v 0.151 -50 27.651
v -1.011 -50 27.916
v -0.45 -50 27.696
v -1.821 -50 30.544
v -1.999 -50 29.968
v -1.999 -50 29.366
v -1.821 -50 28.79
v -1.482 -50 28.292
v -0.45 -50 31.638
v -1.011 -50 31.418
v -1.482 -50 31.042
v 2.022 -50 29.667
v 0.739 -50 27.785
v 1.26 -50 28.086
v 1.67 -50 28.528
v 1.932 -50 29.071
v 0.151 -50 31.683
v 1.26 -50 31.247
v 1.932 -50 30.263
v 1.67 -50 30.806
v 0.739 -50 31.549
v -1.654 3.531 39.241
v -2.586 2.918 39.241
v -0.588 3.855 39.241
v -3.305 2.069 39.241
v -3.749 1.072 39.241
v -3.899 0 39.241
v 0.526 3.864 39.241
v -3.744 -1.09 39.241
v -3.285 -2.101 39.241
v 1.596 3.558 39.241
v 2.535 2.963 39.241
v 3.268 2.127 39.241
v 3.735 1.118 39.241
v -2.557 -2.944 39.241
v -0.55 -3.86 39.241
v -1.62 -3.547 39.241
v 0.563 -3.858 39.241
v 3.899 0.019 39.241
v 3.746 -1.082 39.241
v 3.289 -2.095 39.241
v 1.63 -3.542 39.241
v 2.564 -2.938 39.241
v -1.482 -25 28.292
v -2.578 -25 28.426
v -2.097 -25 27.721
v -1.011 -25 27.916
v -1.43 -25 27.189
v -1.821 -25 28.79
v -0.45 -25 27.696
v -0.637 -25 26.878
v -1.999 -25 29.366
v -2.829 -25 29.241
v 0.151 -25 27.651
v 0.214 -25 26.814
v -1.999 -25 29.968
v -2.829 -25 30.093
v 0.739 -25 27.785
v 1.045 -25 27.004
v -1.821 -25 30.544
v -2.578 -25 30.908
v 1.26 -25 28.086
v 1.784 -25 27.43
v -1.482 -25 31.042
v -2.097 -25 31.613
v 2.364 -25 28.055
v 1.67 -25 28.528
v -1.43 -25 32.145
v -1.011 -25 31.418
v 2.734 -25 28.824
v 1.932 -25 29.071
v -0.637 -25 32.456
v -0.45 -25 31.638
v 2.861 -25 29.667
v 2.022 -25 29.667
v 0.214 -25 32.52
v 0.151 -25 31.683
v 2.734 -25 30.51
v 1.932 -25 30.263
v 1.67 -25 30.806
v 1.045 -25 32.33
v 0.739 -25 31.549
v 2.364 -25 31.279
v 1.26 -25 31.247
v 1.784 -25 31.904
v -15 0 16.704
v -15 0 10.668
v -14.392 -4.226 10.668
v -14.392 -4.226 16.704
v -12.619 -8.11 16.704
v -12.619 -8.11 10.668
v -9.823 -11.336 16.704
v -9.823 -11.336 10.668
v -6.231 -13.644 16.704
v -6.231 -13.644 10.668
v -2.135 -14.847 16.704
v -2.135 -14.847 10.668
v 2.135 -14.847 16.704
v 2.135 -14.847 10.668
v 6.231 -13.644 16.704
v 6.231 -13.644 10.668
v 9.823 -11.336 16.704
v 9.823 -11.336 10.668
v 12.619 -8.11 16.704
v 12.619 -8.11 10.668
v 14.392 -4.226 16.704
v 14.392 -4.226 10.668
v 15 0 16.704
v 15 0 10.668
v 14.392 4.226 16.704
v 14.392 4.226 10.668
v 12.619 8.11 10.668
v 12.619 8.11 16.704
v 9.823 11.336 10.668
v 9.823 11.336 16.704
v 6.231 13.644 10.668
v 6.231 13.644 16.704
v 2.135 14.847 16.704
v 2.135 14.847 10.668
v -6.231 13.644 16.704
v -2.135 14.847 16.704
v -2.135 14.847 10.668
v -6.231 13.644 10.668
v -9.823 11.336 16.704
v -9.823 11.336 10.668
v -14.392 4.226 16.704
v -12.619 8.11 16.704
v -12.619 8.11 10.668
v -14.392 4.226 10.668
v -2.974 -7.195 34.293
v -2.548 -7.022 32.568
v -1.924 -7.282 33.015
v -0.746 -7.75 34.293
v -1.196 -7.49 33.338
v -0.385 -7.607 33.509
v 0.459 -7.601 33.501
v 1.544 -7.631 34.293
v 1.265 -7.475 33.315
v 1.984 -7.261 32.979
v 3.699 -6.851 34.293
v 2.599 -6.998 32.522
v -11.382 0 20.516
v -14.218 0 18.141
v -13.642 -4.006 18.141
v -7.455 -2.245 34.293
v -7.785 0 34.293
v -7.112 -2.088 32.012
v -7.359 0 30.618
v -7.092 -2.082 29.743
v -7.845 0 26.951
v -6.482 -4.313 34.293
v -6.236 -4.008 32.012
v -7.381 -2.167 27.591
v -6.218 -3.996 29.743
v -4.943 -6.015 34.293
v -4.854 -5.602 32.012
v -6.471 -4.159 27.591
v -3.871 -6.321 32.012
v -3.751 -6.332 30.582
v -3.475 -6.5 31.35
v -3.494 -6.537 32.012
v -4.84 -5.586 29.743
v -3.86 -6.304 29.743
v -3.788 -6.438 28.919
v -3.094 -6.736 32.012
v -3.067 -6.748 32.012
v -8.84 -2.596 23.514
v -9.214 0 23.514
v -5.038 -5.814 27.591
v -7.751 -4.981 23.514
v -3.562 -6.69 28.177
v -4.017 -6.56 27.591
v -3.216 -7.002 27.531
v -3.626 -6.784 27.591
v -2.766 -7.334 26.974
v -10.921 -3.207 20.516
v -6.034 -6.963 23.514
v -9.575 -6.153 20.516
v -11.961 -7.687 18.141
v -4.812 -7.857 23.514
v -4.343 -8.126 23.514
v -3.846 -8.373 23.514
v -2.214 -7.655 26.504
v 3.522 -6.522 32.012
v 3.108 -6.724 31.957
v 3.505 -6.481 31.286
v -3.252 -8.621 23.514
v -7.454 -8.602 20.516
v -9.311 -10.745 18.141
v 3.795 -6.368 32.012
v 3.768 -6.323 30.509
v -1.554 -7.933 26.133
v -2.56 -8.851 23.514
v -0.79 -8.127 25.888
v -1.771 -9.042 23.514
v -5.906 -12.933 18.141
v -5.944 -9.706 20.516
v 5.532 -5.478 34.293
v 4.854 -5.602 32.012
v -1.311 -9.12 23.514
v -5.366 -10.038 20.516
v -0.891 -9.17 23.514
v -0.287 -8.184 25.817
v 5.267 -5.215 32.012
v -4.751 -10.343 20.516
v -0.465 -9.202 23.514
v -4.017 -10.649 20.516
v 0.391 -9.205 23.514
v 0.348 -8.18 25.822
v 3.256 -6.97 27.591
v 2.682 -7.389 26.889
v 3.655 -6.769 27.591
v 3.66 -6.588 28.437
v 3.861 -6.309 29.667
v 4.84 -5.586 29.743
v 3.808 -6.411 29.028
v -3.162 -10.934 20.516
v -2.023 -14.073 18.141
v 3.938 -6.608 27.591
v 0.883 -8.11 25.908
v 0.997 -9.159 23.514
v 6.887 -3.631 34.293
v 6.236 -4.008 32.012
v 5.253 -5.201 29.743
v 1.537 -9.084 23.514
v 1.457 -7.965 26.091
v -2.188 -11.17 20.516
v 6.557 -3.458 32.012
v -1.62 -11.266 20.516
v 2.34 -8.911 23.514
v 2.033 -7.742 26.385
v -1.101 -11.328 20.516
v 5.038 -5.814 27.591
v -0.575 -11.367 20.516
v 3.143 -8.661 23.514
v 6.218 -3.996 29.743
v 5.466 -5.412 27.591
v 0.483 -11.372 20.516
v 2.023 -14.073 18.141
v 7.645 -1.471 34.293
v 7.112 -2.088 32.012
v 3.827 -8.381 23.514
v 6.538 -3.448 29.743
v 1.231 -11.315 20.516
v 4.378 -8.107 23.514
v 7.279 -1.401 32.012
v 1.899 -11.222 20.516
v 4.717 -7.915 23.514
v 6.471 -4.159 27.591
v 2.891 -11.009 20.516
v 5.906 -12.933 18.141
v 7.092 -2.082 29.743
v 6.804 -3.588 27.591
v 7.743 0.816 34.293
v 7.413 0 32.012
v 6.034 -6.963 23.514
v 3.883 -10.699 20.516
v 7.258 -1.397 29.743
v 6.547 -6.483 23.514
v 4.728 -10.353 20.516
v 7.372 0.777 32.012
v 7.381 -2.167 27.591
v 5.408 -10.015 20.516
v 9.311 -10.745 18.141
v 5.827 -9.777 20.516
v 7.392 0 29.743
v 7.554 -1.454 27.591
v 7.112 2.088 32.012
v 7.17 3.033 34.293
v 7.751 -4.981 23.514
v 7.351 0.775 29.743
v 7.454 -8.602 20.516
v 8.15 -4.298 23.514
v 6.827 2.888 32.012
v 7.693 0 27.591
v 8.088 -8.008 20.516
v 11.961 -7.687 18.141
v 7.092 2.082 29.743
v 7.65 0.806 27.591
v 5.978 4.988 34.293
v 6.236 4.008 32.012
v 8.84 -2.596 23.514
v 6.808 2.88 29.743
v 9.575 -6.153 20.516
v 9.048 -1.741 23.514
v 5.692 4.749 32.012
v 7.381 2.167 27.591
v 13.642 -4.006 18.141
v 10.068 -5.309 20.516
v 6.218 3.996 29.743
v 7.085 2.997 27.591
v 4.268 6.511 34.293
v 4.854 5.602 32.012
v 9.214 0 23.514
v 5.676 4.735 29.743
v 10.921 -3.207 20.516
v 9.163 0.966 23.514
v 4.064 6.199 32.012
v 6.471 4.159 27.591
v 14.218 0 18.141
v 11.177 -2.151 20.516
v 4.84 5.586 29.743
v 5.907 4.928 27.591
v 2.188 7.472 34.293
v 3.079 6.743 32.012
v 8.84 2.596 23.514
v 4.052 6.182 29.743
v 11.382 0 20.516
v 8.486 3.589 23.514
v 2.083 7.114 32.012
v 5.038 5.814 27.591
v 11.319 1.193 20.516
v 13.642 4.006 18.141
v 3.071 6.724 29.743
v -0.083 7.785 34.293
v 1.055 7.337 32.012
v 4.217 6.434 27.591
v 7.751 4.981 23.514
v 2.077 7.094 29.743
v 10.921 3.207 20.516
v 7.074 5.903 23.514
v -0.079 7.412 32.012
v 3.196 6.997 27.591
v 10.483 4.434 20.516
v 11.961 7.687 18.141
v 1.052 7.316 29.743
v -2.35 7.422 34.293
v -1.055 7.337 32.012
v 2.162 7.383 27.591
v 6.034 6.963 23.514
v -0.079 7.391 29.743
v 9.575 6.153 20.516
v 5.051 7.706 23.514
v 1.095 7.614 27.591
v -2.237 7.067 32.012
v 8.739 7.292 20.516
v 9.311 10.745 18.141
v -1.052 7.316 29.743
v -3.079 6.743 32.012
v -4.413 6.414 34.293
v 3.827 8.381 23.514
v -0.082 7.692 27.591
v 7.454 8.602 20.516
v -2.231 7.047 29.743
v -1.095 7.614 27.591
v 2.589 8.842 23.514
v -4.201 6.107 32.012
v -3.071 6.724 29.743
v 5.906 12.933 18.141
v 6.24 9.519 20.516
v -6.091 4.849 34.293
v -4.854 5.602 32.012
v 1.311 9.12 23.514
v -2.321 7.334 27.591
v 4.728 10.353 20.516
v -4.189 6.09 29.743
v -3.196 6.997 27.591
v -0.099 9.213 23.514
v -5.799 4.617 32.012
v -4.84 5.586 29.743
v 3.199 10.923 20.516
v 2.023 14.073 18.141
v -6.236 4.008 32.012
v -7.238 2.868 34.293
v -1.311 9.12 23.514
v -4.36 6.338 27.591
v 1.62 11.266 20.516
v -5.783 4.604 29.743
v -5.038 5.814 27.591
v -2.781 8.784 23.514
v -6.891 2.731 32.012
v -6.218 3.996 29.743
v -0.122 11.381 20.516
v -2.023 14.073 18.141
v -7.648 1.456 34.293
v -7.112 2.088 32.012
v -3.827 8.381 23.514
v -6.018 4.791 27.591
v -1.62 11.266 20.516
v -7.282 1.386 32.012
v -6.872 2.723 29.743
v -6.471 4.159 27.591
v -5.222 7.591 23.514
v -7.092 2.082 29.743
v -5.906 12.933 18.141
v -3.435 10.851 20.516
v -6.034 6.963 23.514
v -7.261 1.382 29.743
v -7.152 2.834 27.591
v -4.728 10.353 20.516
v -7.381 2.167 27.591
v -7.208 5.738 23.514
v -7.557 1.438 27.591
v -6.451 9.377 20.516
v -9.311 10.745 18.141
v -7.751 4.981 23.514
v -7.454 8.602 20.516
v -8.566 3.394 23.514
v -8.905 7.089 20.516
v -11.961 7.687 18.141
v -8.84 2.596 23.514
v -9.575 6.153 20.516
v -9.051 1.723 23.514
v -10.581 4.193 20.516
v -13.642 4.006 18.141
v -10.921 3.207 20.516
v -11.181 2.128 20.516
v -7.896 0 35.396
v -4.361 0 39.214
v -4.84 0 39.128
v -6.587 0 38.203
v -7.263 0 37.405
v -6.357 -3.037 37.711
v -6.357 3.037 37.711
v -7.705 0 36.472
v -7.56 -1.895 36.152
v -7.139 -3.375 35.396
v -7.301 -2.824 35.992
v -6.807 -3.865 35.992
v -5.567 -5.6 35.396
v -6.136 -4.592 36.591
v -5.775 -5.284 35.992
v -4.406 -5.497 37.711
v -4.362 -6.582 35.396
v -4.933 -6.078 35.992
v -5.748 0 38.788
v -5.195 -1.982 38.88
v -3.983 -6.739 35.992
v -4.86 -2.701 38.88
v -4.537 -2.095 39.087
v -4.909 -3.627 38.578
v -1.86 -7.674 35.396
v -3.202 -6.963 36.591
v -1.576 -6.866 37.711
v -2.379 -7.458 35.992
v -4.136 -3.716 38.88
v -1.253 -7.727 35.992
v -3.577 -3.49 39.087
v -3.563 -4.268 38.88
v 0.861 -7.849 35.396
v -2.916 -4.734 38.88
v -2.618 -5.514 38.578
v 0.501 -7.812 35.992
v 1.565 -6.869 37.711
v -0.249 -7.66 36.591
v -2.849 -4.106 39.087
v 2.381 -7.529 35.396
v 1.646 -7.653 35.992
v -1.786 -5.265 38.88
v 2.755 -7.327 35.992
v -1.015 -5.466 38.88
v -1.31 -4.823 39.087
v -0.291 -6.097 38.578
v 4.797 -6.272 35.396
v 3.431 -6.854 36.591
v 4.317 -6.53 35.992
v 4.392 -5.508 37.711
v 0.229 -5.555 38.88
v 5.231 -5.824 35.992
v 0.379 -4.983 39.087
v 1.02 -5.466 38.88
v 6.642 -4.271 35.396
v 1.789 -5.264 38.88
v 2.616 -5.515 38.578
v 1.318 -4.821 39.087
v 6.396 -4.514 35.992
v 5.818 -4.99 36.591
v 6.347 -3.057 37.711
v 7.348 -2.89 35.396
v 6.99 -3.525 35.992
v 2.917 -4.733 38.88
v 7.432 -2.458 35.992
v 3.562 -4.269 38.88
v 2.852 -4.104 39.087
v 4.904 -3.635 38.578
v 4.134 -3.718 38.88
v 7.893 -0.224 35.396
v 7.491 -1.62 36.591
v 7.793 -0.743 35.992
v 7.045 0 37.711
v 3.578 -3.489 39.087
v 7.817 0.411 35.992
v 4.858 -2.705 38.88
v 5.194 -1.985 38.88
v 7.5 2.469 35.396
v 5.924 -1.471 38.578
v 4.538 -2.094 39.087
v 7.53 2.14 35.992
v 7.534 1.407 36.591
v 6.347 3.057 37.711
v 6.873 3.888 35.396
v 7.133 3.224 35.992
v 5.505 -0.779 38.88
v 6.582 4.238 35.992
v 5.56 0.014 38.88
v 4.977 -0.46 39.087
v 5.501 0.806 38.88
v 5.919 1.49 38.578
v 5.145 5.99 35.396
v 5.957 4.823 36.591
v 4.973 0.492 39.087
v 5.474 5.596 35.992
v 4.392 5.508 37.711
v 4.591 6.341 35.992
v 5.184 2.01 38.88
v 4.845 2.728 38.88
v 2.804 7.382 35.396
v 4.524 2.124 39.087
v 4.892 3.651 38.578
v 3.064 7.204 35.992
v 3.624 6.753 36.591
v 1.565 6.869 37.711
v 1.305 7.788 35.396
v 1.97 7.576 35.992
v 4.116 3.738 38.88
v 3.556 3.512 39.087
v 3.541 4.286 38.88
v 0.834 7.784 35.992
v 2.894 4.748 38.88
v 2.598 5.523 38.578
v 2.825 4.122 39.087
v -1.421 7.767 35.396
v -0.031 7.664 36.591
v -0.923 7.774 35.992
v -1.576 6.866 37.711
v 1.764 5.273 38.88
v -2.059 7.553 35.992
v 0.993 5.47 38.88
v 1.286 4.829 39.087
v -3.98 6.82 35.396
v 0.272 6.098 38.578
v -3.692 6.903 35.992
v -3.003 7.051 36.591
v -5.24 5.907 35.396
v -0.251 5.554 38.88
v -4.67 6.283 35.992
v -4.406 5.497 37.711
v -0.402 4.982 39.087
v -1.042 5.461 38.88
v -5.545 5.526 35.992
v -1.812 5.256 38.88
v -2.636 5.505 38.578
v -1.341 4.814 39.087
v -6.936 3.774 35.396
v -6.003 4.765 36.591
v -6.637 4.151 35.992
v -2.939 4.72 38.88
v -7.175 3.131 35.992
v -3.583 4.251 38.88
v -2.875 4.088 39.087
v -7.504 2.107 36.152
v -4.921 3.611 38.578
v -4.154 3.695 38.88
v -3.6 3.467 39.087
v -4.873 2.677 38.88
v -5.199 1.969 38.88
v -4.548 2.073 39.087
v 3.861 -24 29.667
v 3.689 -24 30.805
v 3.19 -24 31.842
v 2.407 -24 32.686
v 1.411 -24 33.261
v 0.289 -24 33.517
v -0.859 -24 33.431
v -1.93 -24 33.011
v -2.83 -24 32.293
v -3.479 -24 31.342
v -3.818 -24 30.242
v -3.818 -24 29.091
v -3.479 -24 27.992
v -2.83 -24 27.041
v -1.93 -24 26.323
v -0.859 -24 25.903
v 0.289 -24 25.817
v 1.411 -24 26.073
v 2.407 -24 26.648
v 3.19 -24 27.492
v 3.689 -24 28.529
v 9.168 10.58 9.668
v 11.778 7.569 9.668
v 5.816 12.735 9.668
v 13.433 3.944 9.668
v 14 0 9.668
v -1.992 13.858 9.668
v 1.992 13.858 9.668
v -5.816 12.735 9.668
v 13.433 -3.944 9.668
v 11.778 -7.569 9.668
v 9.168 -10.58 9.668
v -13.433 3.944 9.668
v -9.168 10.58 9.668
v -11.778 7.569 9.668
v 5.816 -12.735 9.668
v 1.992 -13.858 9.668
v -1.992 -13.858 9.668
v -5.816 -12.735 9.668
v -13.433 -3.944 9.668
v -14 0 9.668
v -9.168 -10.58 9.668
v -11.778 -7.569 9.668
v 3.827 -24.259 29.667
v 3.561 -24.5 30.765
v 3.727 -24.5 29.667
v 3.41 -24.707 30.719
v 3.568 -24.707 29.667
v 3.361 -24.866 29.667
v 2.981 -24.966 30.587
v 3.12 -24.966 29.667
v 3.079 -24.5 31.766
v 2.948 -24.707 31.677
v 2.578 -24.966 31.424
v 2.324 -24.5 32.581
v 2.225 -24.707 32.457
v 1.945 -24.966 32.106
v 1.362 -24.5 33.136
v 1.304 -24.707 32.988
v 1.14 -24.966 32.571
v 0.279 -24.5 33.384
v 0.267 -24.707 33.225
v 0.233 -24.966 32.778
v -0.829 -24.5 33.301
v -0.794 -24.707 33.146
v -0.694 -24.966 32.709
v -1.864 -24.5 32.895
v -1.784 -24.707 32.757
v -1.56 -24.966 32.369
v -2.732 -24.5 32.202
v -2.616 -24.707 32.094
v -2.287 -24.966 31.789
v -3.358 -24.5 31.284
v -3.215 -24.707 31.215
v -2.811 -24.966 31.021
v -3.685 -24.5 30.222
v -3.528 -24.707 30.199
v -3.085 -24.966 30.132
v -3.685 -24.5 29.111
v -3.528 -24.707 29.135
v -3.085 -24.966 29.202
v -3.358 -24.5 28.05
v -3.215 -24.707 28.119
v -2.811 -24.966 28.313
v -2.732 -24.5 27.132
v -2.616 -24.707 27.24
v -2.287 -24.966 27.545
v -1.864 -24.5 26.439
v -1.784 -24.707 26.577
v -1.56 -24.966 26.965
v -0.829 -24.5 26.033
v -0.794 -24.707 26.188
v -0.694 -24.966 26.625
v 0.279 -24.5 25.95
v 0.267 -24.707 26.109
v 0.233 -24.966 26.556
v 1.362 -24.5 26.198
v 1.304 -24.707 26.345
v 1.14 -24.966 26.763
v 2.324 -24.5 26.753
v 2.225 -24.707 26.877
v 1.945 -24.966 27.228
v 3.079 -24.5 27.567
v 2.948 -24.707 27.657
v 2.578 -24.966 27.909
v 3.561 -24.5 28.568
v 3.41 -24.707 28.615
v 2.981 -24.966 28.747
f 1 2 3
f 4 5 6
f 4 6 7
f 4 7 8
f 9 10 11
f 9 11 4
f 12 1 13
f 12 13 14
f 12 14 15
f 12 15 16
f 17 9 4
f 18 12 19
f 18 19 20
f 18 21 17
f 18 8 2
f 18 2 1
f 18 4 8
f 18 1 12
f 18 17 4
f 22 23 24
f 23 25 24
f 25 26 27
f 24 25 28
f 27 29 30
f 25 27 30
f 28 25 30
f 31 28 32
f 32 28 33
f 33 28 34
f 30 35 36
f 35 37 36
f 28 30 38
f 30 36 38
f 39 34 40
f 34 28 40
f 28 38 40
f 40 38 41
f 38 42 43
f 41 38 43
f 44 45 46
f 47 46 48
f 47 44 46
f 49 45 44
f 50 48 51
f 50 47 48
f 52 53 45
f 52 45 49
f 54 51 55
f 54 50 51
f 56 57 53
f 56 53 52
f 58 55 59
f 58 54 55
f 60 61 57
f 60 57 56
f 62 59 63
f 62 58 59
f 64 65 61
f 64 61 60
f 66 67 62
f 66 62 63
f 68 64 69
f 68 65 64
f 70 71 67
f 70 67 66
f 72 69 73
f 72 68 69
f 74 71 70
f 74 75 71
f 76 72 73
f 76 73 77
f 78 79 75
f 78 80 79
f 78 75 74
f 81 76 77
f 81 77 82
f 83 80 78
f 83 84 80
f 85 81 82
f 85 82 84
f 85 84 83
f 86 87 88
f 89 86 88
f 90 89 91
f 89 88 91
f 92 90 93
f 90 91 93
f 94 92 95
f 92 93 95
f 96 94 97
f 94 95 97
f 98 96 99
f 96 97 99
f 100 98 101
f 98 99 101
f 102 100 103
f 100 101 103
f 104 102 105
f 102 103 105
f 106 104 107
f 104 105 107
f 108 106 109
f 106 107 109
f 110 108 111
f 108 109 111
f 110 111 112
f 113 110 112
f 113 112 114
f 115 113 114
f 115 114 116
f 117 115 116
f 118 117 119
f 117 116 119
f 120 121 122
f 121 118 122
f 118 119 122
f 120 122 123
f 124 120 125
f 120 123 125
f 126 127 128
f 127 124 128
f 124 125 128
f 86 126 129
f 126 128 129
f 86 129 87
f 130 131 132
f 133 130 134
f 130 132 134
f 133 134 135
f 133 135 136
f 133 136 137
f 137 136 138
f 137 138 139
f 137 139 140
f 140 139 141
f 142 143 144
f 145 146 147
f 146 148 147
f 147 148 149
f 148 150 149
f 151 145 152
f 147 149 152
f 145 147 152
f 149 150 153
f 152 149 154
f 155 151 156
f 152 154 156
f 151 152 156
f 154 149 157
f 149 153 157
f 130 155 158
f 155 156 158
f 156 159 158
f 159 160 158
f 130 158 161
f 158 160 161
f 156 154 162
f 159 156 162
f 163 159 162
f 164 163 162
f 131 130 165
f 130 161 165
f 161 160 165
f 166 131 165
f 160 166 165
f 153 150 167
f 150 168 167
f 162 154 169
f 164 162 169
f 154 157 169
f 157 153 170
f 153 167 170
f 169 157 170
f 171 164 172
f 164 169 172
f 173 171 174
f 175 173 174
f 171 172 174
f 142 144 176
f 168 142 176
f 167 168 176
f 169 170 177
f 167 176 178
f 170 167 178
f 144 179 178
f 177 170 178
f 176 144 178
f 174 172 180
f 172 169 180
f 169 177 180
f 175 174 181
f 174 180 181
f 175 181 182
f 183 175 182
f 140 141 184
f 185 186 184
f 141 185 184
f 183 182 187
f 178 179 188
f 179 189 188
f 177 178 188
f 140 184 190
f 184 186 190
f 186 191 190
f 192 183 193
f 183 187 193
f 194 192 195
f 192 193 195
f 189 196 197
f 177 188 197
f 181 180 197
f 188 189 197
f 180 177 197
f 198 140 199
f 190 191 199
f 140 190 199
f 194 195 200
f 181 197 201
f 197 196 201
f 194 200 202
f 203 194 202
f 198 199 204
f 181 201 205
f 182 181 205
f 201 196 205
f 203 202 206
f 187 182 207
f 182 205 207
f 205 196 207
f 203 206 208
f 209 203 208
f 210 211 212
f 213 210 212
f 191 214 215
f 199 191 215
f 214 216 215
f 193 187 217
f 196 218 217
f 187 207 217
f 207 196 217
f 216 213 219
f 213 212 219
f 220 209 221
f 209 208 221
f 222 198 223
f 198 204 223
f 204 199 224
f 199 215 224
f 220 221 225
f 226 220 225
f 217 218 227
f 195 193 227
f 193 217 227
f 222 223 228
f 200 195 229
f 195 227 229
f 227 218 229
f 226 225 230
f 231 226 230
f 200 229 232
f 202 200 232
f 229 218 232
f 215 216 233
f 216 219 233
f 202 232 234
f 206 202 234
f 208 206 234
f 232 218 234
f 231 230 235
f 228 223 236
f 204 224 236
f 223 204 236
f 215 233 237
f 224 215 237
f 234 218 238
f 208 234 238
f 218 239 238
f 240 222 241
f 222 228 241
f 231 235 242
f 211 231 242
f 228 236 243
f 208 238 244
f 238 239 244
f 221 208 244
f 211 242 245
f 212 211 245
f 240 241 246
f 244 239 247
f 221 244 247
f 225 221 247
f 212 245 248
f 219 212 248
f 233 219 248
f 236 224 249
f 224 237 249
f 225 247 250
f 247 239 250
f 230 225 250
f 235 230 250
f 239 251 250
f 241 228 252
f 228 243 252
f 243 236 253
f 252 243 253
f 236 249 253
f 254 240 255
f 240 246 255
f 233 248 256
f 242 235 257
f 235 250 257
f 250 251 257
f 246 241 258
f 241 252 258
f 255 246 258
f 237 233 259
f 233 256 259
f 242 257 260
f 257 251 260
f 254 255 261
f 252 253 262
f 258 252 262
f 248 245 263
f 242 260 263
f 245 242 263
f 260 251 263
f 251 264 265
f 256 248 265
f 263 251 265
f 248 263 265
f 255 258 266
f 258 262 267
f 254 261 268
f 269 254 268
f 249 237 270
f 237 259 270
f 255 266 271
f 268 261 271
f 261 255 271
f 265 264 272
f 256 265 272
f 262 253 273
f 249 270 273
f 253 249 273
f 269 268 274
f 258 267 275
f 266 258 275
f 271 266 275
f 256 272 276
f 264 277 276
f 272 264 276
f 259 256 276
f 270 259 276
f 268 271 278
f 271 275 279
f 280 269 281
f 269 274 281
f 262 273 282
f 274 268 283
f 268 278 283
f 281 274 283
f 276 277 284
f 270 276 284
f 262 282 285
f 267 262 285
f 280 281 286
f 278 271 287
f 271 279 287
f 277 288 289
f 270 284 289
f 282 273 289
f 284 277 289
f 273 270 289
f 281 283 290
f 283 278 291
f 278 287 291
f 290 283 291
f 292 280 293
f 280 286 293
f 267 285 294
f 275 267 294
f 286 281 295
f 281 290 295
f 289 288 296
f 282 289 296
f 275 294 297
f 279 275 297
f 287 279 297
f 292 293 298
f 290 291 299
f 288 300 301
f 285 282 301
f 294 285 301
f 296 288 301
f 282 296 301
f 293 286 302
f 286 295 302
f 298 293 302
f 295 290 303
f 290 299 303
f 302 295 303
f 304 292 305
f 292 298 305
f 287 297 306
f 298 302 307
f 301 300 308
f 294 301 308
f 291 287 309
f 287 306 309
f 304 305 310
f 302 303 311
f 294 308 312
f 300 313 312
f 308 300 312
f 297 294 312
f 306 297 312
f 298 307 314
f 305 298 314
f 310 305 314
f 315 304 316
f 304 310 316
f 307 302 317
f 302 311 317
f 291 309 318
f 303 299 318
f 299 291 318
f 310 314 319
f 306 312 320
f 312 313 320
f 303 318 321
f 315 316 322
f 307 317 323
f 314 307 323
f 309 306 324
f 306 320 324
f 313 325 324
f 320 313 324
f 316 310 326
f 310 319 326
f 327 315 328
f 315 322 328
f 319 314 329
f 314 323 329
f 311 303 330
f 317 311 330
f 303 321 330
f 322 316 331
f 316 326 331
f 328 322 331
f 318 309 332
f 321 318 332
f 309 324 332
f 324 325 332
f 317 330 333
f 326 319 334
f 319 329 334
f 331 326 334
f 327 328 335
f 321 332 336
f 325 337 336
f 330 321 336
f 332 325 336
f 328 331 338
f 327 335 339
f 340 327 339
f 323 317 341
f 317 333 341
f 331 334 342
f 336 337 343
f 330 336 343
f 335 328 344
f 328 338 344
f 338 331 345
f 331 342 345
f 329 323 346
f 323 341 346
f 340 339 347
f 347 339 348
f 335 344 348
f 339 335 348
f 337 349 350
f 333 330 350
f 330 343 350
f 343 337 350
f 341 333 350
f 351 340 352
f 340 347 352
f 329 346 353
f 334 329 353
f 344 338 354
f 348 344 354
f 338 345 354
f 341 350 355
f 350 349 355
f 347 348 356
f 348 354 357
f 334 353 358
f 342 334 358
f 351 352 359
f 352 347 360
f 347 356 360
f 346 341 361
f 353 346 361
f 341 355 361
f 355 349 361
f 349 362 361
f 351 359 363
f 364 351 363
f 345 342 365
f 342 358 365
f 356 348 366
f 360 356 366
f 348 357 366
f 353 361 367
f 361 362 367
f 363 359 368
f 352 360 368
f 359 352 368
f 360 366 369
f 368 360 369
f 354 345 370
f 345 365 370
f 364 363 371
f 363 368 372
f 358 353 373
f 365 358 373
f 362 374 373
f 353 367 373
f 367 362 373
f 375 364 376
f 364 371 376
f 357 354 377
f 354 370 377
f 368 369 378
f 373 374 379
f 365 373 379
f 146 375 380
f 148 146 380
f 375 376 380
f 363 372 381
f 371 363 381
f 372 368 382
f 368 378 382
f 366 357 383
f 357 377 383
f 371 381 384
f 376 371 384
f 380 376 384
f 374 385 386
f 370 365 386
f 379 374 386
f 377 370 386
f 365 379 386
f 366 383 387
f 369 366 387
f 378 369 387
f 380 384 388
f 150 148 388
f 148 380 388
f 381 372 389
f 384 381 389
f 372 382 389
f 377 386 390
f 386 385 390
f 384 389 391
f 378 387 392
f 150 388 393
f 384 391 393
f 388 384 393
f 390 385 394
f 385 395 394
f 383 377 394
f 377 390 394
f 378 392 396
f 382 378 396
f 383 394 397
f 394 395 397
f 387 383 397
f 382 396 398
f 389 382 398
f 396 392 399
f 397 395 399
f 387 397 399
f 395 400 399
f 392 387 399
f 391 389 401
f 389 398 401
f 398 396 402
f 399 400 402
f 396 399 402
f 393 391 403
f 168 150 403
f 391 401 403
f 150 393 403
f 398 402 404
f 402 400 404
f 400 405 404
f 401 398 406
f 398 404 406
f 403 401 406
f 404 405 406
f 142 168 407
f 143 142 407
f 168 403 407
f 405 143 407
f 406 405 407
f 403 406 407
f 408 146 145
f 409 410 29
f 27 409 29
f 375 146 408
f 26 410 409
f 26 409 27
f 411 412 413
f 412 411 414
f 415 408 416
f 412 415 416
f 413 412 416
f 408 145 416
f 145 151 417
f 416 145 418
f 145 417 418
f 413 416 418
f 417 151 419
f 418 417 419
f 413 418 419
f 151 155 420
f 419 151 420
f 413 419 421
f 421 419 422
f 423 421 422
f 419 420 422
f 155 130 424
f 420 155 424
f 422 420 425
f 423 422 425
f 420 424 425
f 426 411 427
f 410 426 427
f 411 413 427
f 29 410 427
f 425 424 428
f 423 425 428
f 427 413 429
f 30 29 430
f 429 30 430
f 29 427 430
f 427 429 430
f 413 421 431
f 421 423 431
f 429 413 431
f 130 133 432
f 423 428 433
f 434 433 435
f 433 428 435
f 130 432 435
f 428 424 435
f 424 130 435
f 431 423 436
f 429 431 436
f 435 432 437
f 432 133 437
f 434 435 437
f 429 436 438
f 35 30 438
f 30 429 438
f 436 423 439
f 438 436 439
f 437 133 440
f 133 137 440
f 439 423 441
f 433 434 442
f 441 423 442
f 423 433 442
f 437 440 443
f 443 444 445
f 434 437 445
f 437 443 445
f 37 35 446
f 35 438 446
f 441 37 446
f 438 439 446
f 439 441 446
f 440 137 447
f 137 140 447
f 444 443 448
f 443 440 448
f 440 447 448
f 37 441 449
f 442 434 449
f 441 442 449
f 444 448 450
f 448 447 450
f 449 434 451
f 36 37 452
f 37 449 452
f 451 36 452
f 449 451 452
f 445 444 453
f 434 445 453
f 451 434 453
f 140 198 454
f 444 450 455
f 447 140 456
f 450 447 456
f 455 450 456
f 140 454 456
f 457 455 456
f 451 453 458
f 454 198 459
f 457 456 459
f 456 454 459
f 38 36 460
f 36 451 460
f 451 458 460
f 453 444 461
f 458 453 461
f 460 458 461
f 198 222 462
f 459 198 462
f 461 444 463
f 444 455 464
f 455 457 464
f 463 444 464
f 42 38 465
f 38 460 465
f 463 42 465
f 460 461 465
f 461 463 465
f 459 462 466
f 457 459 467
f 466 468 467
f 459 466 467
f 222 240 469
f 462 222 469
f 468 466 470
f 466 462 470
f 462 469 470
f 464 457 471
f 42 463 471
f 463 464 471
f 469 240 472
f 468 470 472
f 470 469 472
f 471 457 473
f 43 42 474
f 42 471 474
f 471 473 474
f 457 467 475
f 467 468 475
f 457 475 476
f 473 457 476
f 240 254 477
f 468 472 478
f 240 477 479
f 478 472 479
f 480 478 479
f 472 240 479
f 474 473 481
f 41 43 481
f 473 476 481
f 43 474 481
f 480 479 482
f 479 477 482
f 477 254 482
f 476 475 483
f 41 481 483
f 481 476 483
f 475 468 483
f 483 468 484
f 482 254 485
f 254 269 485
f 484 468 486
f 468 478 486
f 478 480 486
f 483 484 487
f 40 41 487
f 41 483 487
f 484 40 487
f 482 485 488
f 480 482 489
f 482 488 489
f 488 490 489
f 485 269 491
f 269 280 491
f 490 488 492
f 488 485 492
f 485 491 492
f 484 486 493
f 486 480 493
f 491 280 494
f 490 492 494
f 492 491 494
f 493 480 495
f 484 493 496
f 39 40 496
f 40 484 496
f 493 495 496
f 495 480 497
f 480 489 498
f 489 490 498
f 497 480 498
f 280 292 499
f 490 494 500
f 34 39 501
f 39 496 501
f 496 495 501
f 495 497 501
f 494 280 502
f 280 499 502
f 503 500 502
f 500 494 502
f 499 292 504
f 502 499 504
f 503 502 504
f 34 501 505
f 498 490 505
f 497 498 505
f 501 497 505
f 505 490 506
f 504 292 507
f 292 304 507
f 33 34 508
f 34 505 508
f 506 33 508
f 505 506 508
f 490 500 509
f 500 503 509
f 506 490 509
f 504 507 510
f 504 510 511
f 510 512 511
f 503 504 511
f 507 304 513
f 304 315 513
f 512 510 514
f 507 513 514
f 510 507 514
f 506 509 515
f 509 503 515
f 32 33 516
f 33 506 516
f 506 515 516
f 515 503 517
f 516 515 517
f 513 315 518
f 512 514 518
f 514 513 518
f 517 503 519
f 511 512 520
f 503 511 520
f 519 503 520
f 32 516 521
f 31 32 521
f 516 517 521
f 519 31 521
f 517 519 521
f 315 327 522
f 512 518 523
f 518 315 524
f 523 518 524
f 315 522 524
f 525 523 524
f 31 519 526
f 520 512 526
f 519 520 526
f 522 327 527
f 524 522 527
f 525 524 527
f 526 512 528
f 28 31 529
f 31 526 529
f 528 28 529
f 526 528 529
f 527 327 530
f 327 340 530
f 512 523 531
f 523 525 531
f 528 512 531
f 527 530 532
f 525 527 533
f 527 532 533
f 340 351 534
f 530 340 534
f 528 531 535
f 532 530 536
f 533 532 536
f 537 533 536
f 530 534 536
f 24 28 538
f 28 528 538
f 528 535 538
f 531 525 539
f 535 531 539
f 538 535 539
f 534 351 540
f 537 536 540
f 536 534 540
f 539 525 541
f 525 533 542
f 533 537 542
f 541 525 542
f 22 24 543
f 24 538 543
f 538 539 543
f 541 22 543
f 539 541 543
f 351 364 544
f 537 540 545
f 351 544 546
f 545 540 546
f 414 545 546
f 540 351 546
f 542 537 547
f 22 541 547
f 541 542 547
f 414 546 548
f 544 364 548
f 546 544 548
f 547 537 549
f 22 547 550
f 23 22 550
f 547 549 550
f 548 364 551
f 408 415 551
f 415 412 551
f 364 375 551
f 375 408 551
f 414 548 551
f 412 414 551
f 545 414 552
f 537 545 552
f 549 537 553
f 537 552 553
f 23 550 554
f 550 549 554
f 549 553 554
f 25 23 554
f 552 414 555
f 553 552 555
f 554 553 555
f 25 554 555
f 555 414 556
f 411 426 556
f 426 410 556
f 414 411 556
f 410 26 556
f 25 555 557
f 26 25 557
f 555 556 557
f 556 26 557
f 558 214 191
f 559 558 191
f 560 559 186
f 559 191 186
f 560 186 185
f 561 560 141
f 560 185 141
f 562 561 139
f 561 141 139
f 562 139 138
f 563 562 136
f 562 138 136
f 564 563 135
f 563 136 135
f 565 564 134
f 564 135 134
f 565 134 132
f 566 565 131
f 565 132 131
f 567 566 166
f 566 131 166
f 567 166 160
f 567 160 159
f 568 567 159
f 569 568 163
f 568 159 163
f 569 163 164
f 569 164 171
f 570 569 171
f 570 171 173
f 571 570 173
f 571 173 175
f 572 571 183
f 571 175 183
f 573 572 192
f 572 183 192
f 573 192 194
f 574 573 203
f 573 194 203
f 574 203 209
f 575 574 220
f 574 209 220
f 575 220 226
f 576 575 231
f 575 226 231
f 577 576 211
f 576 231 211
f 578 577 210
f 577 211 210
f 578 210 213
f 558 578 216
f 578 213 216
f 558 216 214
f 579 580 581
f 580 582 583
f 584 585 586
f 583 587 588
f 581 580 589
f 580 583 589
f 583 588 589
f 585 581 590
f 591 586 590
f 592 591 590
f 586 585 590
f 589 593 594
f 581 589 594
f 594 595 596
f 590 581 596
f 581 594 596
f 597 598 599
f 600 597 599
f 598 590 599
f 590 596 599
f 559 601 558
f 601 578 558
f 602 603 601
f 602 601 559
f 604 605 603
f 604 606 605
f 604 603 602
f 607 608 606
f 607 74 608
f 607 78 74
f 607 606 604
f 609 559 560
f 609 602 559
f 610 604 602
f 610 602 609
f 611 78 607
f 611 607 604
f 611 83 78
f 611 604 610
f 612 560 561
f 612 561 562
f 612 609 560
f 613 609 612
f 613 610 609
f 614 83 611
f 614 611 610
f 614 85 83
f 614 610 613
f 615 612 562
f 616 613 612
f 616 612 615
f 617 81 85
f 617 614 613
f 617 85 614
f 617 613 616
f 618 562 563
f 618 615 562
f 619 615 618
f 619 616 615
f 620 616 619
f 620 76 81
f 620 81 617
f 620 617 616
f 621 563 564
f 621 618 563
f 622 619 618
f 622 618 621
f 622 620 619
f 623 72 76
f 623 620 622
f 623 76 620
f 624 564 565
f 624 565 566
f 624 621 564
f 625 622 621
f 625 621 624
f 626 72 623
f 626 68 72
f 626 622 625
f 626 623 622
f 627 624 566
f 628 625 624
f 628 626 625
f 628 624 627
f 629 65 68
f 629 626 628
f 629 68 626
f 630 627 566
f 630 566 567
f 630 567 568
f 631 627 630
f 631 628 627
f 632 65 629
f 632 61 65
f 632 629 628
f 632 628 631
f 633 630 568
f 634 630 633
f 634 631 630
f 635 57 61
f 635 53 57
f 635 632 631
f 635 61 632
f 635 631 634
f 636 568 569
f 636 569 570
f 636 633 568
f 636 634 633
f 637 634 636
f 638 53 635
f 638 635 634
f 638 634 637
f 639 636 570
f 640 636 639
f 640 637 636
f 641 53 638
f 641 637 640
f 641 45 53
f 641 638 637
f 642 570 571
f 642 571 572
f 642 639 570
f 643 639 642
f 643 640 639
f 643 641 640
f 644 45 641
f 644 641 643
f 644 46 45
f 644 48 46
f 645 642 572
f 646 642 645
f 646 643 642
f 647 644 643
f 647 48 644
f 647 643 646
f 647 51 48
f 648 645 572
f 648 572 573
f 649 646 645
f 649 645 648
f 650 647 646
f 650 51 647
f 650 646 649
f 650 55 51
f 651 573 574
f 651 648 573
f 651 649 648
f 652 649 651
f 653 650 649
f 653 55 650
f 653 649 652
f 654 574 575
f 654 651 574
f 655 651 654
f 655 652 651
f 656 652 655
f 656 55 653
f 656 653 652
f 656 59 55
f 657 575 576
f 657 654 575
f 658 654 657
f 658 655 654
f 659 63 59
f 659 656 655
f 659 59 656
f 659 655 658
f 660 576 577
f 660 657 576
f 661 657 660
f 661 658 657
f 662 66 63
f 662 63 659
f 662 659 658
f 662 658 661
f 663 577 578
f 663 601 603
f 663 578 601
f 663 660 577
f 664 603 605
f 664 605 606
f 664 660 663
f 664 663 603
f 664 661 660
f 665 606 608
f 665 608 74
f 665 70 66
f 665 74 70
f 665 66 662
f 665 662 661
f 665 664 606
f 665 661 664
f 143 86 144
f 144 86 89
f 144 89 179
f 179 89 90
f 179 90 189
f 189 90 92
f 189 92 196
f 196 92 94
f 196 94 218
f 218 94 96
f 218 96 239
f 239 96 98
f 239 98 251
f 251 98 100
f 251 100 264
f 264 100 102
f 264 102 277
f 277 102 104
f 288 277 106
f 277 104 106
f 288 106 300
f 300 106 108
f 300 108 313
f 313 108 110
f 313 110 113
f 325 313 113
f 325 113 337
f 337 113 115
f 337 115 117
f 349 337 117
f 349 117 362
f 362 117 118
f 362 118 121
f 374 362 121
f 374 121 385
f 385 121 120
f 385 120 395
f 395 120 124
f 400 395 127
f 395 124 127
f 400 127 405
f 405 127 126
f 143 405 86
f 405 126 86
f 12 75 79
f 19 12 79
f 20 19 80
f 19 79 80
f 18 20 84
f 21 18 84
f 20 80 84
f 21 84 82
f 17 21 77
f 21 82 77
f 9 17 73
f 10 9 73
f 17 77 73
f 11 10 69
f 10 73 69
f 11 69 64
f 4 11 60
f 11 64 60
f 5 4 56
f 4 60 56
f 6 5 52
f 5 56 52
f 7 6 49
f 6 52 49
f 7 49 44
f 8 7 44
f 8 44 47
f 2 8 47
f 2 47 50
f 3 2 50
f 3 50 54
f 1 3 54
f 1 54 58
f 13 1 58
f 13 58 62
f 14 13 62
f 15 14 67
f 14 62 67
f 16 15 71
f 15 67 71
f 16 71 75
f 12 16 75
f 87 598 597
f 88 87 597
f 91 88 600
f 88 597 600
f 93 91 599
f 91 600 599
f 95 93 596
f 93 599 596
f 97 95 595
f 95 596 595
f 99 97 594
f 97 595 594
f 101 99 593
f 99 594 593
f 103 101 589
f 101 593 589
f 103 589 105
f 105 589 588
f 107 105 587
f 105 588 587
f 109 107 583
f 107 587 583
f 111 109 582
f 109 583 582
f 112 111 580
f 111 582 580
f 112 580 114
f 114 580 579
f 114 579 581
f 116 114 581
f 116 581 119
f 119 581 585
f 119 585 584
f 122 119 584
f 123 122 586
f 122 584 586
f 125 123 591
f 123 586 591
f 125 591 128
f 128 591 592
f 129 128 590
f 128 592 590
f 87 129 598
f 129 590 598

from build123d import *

# Parameters (mm, degrees)
F2_R     = 3.8609958539
F3_DEPTH = 25
F4_R     = 2.0215779579
F5_DEPTH = 25
F6_R     = 4
F8_R     = 1
F9_SIZE  = 1


# Not quite as in the source:
# - a fillet or chamfer that OpenCascade refuses, or shapes differently, is made with other operations: its cross-section is extruded or revolved along the edge and cut away or added


with BuildPart() as f1:
    # F0 (on Front) → F1 (revolve)
    with BuildSketch(Plane.XZ):
        with BuildLine():
            Line((0, 9.6684011082), (0, 39.240504275))
            Line((0, 39.240504275), (-10, 39.240504275))
            ThreePointArc((-10, 39.240504275), (-7.7458675852, 27.3525359295), (-15, 17.6684011082))
            Line((-15, 17.6684011082), (-15, 9.6684011082))
            Line((-15, 9.6684011082), (0, 9.6684011082))
        make_face()
    revolve(axis=Axis((0, 0, 24.4544526916), (0, 0, 1)))

    # F2 (on Front) → F3 (join)
    with BuildSketch(Plane.XZ):
        with Locations((0, 29.6669229865)):
            Circle(F2_R)
    extrude(amount=F3_DEPTH)

    # F4 (on face) → F5 (join)
    with BuildSketch(Plane.XZ.offset(25)):
        with Locations((0, 29.6669229865)):
            Circle(F4_R)
    extrude(amount=F5_DEPTH)

    # F6
    f6_edges = [f1.edges().sort_by_distance(p)[0] for p in [
        (10, 0, 39.240504),
    ]]
    fillet(f6_edges, radius=F6_R)

    # F7: chamfer of 1 on 1 edges, made by hand

    # F7_s1 → F7_t2 (revolve, cut)
    with BuildSketch(Plane.XZ):
        with BuildLine():
            Line((-14.1986684737, 18.1758192127), (-15.0191266727, 16.668849252))
            Line((-15.0191266727, 16.668849252), (-15.0391266727, 16.668849252))
            ThreePointArc((-15.0391266727, 16.668849252), (-15.02, 17.1686251801), (-15.02, 17.6684011082))
            Line((-15.02, 17.6684011082), (-15.00981132, 17.685829189))
            ThreePointArc((-15.00981132, 17.685829189), (-14.6008655323, 17.9246397079), (-14.2095227335, 18.192617577))
            Line((-14.2095227335, 18.192617577), (-14.1986684737, 18.1758192127))
        make_face()
    revolve(axis=Axis((0, 0, 17.6684011082), (0, 0, 1)), mode=Mode.SUBTRACT)

    # F8
    f8_edges = [f1.edges().sort_by_distance(p)[0] for p in [
        (-3.860996, -25, 29.666923),
    ]]
    fillet(f8_edges, radius=F8_R)

    # F9
    f9_edges = [f1.edges().sort_by_distance(p)[0] for p in [
        (15, 0, 9.668401),
    ]]
    chamfer(f9_edges, length=F9_SIZE)


solid = f1.part
